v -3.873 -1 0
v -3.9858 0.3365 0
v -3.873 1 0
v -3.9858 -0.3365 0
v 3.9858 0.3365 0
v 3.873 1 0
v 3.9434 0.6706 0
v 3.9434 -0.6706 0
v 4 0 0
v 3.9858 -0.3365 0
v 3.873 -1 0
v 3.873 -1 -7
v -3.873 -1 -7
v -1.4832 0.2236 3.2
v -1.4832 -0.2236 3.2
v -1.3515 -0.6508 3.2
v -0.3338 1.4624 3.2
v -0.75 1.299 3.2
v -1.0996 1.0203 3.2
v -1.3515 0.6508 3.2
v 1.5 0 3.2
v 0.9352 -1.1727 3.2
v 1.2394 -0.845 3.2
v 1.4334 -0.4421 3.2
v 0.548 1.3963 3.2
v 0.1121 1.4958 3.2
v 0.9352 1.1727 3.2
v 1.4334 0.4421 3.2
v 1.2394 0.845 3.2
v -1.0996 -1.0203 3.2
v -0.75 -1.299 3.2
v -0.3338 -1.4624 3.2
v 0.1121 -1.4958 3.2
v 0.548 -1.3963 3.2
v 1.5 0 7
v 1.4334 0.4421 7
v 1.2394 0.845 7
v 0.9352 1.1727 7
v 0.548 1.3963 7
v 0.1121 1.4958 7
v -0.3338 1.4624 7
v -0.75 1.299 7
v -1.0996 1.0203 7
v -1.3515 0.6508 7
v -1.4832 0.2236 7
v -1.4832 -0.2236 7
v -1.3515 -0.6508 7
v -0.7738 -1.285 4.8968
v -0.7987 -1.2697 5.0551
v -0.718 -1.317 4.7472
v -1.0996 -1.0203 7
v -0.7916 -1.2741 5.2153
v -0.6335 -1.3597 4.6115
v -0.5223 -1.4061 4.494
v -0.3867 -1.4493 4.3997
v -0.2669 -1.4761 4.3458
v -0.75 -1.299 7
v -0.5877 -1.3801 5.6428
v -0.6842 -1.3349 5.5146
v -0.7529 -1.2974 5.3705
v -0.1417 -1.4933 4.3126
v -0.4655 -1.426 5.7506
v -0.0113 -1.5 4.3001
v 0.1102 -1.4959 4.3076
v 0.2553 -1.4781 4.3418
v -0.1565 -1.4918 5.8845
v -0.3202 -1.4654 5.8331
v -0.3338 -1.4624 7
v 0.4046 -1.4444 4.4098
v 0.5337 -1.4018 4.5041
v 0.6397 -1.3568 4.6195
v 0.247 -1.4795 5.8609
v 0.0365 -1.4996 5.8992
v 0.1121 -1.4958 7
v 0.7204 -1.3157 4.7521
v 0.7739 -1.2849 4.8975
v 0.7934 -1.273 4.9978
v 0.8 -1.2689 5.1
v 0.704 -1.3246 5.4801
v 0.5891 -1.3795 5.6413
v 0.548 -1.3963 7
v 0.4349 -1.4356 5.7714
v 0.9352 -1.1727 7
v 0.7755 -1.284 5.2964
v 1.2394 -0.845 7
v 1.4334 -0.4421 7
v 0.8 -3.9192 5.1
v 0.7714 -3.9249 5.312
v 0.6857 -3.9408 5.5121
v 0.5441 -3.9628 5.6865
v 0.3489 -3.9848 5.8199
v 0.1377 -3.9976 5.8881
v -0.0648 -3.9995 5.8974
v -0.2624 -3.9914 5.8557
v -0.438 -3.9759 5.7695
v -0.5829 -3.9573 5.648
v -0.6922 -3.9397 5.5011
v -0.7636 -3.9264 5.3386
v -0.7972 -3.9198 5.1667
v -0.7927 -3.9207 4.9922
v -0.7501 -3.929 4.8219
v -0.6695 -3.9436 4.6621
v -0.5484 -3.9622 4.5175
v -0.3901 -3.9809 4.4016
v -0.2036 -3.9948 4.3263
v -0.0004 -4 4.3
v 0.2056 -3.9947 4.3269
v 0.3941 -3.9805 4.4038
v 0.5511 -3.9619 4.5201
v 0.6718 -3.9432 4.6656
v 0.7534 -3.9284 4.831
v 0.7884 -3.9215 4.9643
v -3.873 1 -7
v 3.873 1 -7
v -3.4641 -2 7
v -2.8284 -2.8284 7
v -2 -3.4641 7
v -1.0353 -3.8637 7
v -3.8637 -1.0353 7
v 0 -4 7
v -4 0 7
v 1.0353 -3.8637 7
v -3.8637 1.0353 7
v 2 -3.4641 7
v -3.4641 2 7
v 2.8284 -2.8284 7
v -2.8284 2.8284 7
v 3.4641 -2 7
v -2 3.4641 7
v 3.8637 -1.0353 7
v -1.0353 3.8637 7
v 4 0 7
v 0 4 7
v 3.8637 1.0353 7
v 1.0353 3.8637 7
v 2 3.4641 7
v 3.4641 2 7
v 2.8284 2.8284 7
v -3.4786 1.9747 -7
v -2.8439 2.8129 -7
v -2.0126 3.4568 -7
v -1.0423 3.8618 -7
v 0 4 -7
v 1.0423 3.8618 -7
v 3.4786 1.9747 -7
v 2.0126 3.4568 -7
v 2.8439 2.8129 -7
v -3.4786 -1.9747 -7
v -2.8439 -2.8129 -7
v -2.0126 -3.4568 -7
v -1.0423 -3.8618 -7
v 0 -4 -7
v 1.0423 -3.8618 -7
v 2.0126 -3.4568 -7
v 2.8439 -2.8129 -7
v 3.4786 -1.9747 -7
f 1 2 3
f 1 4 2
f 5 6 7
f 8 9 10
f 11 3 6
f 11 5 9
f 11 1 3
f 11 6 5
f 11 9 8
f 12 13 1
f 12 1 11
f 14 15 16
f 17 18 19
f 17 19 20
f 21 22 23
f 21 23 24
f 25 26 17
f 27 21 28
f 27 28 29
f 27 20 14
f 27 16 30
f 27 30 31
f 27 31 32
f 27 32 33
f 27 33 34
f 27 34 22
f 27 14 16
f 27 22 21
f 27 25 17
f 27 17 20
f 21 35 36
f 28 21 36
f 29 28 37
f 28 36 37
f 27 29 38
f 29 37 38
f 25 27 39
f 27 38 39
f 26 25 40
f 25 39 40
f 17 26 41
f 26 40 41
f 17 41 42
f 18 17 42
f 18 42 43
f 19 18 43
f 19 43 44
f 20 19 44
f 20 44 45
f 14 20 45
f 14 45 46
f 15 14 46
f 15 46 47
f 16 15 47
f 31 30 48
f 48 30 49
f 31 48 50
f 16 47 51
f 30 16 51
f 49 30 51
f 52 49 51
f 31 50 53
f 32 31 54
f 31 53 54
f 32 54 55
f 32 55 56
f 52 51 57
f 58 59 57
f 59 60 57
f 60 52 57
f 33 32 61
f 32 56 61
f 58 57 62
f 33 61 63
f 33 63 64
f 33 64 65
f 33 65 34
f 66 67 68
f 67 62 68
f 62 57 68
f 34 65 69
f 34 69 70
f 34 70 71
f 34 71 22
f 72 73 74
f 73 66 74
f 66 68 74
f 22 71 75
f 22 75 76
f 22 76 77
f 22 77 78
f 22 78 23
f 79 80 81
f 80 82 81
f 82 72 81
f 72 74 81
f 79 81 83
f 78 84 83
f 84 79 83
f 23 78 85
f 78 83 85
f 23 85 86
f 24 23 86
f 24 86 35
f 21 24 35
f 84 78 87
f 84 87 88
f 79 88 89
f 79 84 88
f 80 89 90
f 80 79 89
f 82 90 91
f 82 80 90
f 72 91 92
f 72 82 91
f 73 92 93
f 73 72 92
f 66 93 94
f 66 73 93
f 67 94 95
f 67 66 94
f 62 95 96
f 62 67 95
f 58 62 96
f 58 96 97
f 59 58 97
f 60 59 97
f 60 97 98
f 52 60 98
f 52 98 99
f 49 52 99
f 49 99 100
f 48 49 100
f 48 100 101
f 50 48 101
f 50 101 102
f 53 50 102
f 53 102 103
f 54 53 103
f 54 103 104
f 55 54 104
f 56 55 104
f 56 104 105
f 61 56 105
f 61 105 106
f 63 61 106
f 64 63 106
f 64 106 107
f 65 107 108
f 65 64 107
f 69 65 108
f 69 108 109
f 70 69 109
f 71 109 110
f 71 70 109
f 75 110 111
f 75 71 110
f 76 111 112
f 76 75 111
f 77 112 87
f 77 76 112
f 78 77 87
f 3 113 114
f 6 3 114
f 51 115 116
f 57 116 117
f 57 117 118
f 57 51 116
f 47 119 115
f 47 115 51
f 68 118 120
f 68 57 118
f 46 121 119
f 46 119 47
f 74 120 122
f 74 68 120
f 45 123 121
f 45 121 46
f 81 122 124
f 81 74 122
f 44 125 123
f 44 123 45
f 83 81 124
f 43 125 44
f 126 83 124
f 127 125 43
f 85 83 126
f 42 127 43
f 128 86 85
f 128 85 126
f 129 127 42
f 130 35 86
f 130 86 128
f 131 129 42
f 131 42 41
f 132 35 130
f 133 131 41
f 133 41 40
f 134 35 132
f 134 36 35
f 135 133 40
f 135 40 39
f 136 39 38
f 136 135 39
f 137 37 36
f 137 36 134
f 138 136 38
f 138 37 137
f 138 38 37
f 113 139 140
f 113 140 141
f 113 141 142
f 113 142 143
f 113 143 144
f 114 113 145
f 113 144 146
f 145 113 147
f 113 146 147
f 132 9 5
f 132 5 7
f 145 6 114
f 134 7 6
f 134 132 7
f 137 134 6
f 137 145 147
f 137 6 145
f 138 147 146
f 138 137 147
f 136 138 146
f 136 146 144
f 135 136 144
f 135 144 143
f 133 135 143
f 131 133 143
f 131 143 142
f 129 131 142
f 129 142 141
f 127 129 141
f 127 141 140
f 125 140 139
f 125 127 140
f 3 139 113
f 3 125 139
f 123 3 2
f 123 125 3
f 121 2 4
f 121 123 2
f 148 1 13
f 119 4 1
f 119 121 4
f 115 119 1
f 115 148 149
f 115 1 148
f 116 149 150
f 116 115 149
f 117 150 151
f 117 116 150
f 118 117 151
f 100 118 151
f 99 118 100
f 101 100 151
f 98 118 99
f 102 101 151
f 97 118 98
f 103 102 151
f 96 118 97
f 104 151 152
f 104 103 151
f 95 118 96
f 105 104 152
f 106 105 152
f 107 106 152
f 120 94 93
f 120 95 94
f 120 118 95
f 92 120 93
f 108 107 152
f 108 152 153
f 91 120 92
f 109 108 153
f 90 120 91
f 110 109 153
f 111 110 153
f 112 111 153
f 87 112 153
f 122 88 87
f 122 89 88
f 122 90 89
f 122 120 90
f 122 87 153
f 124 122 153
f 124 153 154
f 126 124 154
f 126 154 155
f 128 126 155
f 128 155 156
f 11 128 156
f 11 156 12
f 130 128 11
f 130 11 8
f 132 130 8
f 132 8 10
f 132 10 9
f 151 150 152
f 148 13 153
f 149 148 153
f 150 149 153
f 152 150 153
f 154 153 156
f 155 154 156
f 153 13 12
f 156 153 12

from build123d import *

# Parameters (mm, degrees)
F0_R     = 4
F1_DEPTH = 7
F2_R     = 1.5
F3_DEPTH = 3.8
F4_W     = 10
F4_H     = 2
F5_DEPTH = 7
F6_R     = 0.8
F7_DEPTH = 4.001


with BuildPart() as f1:
    # F0 (on Top) → F1 (new body, symmetric)
    with BuildSketch(Plane.XY):
        Circle(F0_R)
    extrude(amount=F1_DEPTH, both=True)

    # F2 (on face) → F3 (cut)
    with BuildSketch(Plane.XY.offset(7)):
        Circle(F2_R)
    extrude(amount=-F3_DEPTH, mode=Mode.SUBTRACT)

    # F4 (on face) → F5 (cut)
    with BuildSketch(Plane(origin=(0, 0, -7), x_dir=(1, 0, 0), z_dir=(0, 0, -1))):
        Rectangle(F4_W, F4_H)
    extrude(amount=-F5_DEPTH, mode=Mode.SUBTRACT)

    # F6 (on Front) → F7 (cut, through all)
    with BuildSketch(Plane.XZ):
        with Locations((0, 5.1)):
            Circle(F6_R)
    extrude(amount=F7_DEPTH, mode=Mode.SUBTRACT)


solid = f1.part
